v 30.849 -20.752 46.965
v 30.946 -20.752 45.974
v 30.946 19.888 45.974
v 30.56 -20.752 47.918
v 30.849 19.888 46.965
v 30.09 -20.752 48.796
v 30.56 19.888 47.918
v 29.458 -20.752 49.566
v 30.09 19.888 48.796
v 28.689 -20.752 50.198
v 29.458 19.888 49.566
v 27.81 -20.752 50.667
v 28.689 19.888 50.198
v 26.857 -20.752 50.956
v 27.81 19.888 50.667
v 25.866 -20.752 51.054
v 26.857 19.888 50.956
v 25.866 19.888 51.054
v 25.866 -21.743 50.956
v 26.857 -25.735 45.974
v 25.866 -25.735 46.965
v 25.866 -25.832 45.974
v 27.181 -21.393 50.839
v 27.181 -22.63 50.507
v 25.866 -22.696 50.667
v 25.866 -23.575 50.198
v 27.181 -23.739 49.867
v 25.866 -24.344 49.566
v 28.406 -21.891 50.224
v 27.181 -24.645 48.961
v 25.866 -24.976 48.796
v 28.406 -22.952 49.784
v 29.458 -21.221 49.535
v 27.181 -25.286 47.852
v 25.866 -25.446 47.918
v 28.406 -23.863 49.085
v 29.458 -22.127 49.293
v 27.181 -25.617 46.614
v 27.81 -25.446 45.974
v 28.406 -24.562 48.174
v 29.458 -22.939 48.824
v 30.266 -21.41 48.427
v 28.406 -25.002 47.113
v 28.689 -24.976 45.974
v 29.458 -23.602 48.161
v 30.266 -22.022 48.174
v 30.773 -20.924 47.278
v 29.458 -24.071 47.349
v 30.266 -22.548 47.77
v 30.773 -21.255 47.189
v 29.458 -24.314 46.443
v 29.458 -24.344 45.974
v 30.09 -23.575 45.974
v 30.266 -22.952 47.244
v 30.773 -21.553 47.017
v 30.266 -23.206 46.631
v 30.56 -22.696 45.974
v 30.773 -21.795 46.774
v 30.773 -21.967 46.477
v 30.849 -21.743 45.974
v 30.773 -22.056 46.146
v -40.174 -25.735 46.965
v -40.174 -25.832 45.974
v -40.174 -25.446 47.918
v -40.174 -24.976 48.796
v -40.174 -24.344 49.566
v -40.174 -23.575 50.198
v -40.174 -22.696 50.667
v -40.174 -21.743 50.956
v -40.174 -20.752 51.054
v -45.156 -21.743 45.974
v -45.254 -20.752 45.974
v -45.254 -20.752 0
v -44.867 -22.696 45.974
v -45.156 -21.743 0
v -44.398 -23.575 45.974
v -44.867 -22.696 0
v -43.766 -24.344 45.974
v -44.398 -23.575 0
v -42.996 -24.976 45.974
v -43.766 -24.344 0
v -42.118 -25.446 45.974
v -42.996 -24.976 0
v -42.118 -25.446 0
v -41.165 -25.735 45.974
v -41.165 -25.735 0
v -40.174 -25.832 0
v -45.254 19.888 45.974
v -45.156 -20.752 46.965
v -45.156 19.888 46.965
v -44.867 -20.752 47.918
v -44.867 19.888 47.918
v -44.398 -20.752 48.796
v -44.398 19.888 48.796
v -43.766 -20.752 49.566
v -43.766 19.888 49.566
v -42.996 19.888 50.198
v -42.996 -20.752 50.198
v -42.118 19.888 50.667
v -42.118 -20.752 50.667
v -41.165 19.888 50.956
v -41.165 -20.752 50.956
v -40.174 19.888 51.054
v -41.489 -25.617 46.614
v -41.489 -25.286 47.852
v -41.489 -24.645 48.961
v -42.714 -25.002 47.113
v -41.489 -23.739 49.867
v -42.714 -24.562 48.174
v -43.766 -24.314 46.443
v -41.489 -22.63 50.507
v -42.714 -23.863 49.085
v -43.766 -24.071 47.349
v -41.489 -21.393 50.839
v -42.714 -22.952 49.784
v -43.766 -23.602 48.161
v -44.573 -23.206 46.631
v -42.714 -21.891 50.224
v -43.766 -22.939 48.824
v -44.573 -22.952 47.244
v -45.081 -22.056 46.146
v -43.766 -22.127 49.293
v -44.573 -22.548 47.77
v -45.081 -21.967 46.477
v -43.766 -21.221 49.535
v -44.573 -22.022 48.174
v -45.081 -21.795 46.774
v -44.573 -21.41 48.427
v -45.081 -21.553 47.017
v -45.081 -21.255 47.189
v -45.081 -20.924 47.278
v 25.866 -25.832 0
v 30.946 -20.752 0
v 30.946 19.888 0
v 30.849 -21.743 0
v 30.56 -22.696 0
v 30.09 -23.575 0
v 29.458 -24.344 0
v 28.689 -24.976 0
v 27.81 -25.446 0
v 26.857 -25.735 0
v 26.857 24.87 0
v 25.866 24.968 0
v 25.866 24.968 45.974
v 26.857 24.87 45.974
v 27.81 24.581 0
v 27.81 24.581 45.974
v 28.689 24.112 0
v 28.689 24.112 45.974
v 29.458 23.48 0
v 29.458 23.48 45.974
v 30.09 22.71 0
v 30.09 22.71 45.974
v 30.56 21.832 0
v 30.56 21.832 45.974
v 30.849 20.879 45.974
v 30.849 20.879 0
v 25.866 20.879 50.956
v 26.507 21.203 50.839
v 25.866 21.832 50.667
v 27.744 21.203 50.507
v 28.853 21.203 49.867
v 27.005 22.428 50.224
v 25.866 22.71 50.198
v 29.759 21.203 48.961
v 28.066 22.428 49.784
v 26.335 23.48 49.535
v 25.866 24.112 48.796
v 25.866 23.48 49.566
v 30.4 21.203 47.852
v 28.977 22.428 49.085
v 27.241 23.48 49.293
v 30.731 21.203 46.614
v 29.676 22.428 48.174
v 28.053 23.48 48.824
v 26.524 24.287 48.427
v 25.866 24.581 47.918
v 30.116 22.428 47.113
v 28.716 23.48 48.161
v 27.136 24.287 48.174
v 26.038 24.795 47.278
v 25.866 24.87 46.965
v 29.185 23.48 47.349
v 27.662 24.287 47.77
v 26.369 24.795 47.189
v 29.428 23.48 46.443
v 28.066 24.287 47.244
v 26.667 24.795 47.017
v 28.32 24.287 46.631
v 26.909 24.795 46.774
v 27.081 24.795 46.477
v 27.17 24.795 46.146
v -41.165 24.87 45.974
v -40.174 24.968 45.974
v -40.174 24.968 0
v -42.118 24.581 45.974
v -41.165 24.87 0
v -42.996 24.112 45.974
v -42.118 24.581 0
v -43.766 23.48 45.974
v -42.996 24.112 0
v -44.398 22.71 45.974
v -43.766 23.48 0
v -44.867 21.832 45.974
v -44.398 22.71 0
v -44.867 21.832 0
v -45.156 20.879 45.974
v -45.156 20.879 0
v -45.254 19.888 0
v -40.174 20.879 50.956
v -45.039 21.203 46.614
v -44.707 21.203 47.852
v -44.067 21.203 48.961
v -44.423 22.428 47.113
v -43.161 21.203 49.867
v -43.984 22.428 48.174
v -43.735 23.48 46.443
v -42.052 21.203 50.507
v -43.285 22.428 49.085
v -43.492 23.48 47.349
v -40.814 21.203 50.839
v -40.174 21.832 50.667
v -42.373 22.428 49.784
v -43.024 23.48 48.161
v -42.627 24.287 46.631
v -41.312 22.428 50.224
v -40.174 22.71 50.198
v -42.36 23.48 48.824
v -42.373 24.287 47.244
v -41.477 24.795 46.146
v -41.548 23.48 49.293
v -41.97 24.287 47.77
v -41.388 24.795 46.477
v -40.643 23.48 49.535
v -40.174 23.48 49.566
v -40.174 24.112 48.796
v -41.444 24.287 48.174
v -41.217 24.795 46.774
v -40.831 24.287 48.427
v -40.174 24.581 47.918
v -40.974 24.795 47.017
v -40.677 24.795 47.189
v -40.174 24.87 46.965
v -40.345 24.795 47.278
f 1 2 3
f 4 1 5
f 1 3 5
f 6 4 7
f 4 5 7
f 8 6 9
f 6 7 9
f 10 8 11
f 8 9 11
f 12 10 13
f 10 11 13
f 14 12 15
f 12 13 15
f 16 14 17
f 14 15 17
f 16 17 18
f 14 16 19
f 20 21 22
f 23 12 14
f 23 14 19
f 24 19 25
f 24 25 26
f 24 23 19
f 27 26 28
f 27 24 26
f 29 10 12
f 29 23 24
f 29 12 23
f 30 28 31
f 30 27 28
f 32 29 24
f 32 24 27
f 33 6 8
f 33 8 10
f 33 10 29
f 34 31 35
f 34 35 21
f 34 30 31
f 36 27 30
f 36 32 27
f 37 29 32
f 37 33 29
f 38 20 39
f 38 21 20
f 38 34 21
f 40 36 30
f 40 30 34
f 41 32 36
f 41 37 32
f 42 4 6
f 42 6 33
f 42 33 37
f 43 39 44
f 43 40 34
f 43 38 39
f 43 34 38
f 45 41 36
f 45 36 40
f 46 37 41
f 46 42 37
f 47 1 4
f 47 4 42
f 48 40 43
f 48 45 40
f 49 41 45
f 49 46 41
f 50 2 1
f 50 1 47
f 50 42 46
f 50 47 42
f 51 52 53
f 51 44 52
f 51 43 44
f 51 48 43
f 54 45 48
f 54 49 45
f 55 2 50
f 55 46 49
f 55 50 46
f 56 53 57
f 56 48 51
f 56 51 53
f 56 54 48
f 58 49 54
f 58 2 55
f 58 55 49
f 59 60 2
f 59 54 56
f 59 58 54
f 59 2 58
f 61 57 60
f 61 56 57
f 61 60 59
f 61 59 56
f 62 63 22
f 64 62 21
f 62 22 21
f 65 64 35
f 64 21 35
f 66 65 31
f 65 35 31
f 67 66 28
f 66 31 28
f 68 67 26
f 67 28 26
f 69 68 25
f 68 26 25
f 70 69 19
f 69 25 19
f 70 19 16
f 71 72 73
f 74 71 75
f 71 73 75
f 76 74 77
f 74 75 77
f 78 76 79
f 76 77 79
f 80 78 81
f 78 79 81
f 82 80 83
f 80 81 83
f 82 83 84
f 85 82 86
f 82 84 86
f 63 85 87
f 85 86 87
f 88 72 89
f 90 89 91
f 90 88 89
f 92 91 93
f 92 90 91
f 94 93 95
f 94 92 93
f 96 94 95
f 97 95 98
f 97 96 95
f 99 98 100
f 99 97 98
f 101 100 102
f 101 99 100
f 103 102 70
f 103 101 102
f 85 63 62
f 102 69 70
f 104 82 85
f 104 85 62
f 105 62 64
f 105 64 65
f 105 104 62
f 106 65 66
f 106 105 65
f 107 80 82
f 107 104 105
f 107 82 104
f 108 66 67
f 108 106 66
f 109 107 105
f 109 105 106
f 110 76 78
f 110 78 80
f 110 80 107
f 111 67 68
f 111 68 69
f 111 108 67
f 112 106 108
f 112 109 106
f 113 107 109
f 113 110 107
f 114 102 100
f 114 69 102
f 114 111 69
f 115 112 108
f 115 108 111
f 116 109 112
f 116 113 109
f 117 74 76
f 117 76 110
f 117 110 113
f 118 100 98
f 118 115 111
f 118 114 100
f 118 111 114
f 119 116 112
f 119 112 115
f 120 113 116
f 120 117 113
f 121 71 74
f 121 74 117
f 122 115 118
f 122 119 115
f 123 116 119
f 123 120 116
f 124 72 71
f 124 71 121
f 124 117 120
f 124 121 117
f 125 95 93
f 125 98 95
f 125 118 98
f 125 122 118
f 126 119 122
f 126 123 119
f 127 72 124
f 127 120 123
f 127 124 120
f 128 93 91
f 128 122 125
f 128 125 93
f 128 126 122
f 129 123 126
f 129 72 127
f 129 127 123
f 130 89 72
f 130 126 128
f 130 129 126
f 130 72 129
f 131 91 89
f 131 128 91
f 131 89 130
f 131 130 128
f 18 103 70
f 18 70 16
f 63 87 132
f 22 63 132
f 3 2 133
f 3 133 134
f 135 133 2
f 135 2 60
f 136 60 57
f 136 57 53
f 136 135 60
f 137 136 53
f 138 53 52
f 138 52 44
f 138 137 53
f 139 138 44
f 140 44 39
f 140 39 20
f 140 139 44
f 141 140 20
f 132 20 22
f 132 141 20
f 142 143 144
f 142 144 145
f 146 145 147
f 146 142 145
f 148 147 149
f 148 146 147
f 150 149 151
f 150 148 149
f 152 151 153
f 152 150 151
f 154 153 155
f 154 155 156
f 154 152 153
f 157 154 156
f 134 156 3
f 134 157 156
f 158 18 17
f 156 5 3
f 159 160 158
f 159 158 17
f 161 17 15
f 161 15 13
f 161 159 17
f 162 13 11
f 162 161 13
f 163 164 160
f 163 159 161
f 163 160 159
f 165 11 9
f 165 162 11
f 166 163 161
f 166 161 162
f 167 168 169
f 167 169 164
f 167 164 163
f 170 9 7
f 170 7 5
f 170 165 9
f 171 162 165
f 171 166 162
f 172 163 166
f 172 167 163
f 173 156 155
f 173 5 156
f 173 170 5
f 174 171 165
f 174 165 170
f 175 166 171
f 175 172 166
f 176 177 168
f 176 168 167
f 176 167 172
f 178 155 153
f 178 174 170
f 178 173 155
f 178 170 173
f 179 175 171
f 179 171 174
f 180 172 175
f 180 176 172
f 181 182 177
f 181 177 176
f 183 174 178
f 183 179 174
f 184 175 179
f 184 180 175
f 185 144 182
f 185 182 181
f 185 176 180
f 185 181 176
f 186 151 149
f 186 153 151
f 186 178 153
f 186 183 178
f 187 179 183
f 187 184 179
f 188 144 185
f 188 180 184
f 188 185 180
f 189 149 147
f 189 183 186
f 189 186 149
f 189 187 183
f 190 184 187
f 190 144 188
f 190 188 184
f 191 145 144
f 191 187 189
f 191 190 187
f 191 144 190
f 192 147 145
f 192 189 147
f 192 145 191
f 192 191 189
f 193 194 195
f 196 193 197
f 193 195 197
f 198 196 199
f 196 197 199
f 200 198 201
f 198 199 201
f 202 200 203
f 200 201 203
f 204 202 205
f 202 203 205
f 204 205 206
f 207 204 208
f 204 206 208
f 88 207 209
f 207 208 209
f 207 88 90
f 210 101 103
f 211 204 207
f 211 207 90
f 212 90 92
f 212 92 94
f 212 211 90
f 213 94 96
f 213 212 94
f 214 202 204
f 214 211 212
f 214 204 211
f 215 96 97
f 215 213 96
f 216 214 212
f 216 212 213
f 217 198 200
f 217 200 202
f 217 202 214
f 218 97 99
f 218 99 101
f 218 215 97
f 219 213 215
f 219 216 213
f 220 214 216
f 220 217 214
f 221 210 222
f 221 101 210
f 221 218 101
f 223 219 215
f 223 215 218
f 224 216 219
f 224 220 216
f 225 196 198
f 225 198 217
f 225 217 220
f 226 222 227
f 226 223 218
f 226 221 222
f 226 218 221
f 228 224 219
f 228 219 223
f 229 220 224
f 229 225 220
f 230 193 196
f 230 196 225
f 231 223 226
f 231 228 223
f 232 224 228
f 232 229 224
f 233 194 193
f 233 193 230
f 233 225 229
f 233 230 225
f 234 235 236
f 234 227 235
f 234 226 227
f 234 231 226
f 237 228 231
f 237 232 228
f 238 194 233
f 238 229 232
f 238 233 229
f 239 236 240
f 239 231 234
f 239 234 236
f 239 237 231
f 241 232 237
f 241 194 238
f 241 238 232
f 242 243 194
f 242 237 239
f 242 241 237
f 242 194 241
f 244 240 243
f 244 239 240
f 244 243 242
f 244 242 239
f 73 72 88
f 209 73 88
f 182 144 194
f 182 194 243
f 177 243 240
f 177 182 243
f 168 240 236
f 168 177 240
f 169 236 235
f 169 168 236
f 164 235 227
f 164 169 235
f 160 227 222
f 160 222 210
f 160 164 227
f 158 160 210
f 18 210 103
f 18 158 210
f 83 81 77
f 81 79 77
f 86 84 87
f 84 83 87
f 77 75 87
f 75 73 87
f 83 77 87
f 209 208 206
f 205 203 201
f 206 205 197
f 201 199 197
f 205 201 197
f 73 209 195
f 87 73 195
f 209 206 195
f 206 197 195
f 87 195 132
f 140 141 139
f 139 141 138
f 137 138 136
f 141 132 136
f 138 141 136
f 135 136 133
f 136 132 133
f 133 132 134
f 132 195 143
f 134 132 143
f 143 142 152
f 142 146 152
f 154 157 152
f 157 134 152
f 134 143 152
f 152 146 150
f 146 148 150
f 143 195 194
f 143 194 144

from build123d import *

# Parameters (mm, degrees)
F0_W         = 76.2
F0_H         = 50.8
F1_DEPTH     = 51.054
F2_R         = 5.08
F3_T1_DEPTH  = 58.674
F3_S5_W      = 5.08
F3_S5_H      = 5.08
F3_T6_DEPTH  = 5.08
F3_S11_W     = 5.08
F3_S11_H     = 5.08
F3_T12_DEPTH = 5.08
F3_S17_W     = 5.08
F3_S17_H     = 5.08
F3_T18_DEPTH = 5.08
F3_S23_W     = 5.08
F3_S23_H     = 5.08
F3_T24_DEPTH = 5.08


# Not quite as in the source:
# - a fillet or chamfer that OpenCascade refuses, or shapes differently, is made with other operations: its cross-section is extruded or revolved along the edge and cut away or added


with BuildPart() as f1:
    # F0 (on Top) → F1 (new body)
    with BuildSketch(Plane.XY):
        with Locations((-7.1537382901, -0.4322529342)):
            Rectangle(F0_W, F0_H)
    extrude(amount=F1_DEPTH)

    # F2
    f2_edges = [f1.edges().sort_by_distance(p)[0] for p in [
        (-7.153738, 24.967747, 51.054),
        (-45.253738, -0.432253, 51.054),
        (-7.153738, -25.832253, 51.054),
        (30.946262, -0.432253, 51.054),
    ]]
    fillet(f2_edges, radius=F2_R)

    # F3: fillet of radius 5.08 on 4 edges, made by hand

    # F3_s2 → F3_t1 (cut)
    with BuildSketch(Plane.XY.offset(-12.7)):
        with BuildLine():
            ThreePointArc((-40.1737382901, 24.9677470658), (-43.7658407385, 23.4798495143), (-45.2537382901, 19.8877470658))
            Line((-45.2537382901, 19.8877470658), (-45.2537382901, 24.9677470658))
            Line((-45.2537382901, 24.9677470658), (-40.1737382901, 24.9677470658))
        make_face()
        with BuildLine():
            ThreePointArc((-45.2537382901, -20.7522529342), (-43.7658407385, -24.3443553826), (-40.1737382901, -25.8322529342))
            Line((-40.1737382901, -25.8322529342), (-45.2537382901, -25.8322529342))
            Line((-45.2537382901, -25.8322529342), (-45.2537382901, -20.7522529342))
        make_face()
        with BuildLine():
            ThreePointArc((30.9462617099, -20.7522529342), (29.4583641584, -24.3443553826), (25.8662617099, -25.8322529342))
            Line((25.8662617099, -25.8322529342), (30.9462617099, -25.8322529342))
            Line((30.9462617099, -25.8322529342), (30.9462617099, -20.7522529342))
        make_face()
        with BuildLine():
            ThreePointArc((25.8662617099, 24.9677470658), (29.4583641584, 23.4798495143), (30.9462617099, 19.8877470658))
            Line((30.9462617099, 19.8877470658), (30.9462617099, 24.9677470658))
            Line((30.9462617099, 24.9677470658), (25.8662617099, 24.9677470658))
        make_face()
    extrude(amount=F3_T1_DEPTH, mode=Mode.SUBTRACT)


with BuildPart() as f3_tool4:
    # F3_s5 → F3_t6 (new body)
    with BuildSketch(Plane.XZ.offset(-19.8877470658)):
        with Locations((28.4062617099, 48.514)):
            Rectangle(F3_S5_W, F3_S5_H)
    extrude(amount=-F3_T6_DEPTH)

    # F3_s7 → F3_t8 (revolve, cut)
    with BuildSketch(Plane(origin=(25.8662617099, 19.8877470658, 45.974), x_dir=(-0.7071067812, 0, -0.7071067812), z_dir=(0.7071067812, 0, -0.7071067812))):
        with BuildLine():
            ThreePointArc((0, -5.08), (5.08, 0), (0, 5.08))
            Line((0, 5.08), (0, -5.08))
        make_face()
    revolve(axis=Axis((25.8662617099, 19.8877470658, 45.974), (0, 1, 0)), mode=Mode.SUBTRACT)


with BuildPart() as f1_1:
    add(f1.part)

    # F3_t3: cut F3_tool4
    add(f3_tool4.part, mode=Mode.SUBTRACT)


with BuildPart() as f3_tool10:
    # F3_s11 → F3_t12 (new body)
    with BuildSketch(Plane.YZ.offset(25.8662617099)):
        with Locations((-23.2922529342, 48.514)):
            Rectangle(F3_S11_W, F3_S11_H)
    extrude(amount=F3_T12_DEPTH)

    # F3_s13 → F3_t14 (revolve, cut)
    with BuildSketch(Plane(origin=(25.8662617099, -20.7522529342, 45.974), x_dir=(0, 0.7071067812, -0.7071067812), z_dir=(0, -0.7071067812, -0.7071067812))):
        with BuildLine():
            ThreePointArc((0, -5.08), (5.08, 0), (0, 5.08))
            Line((0, 5.08), (0, -5.08))
        make_face()
    revolve(axis=Axis((25.8662617099, -20.7522529342, 45.974), (1, 0, 0)), mode=Mode.SUBTRACT)


with BuildPart() as f1_2:
    add(f1_1.part)

    # F3_t9: cut F3_tool10
    add(f3_tool10.part, mode=Mode.SUBTRACT)


with BuildPart() as f3_tool16:
    # F3_s17 → F3_t18 (new body)
    with BuildSketch(Plane.YZ.offset(-40.1737382901)):
        with Locations((-23.2922529342, 48.514)):
            Rectangle(F3_S17_W, F3_S17_H)
    extrude(amount=-F3_T18_DEPTH)

    # F3_s19 → F3_t20 (revolve, cut)
    with BuildSketch(Plane(origin=(-40.1737382901, -20.7522529342, 45.974), x_dir=(0, 0.7071067812, -0.7071067812), z_dir=(0, 0.7071067812, 0.7071067812))):
        with BuildLine():
            ThreePointArc((0, -5.08), (5.08, 0), (0, 5.08))
            Line((0, 5.08), (0, -5.08))
        make_face()
    revolve(axis=Axis((-40.1737382901, -20.7522529342, 45.974), (-1, 0, 0)), mode=Mode.SUBTRACT)


with BuildPart() as f1_3:
    add(f1_2.part)

    # F3_t15: cut F3_tool16
    add(f3_tool16.part, mode=Mode.SUBTRACT)


with BuildPart() as f3_tool22:
    # F3_s23 → F3_t24 (new body)
    with BuildSketch(Plane.XZ.offset(-19.8877470658)):
        with Locations((-42.7137382901, 48.514)):
            Rectangle(F3_S23_W, F3_S23_H)
    extrude(amount=-F3_T24_DEPTH)

    # F3_s25 → F3_t26 (revolve, cut)
    with BuildSketch(Plane(origin=(-40.1737382901, 19.8877470658, 45.974), x_dir=(0.7071067812, 0, -0.7071067812), z_dir=(0.7071067812, 0, 0.7071067812))):
        with BuildLine():
            ThreePointArc((0, -5.08), (5.08, 0), (0, 5.08))
            Line((0, 5.08), (0, -5.08))
        make_face()
    revolve(axis=Axis((-40.1737382901, 19.8877470658, 45.974), (0, 1, 0)), mode=Mode.SUBTRACT)


with BuildPart() as f1_4:
    add(f1_3.part)

    # F3_t21: cut F3_tool22
    add(f3_tool22.part, mode=Mode.SUBTRACT)


solid = f1_4.part
